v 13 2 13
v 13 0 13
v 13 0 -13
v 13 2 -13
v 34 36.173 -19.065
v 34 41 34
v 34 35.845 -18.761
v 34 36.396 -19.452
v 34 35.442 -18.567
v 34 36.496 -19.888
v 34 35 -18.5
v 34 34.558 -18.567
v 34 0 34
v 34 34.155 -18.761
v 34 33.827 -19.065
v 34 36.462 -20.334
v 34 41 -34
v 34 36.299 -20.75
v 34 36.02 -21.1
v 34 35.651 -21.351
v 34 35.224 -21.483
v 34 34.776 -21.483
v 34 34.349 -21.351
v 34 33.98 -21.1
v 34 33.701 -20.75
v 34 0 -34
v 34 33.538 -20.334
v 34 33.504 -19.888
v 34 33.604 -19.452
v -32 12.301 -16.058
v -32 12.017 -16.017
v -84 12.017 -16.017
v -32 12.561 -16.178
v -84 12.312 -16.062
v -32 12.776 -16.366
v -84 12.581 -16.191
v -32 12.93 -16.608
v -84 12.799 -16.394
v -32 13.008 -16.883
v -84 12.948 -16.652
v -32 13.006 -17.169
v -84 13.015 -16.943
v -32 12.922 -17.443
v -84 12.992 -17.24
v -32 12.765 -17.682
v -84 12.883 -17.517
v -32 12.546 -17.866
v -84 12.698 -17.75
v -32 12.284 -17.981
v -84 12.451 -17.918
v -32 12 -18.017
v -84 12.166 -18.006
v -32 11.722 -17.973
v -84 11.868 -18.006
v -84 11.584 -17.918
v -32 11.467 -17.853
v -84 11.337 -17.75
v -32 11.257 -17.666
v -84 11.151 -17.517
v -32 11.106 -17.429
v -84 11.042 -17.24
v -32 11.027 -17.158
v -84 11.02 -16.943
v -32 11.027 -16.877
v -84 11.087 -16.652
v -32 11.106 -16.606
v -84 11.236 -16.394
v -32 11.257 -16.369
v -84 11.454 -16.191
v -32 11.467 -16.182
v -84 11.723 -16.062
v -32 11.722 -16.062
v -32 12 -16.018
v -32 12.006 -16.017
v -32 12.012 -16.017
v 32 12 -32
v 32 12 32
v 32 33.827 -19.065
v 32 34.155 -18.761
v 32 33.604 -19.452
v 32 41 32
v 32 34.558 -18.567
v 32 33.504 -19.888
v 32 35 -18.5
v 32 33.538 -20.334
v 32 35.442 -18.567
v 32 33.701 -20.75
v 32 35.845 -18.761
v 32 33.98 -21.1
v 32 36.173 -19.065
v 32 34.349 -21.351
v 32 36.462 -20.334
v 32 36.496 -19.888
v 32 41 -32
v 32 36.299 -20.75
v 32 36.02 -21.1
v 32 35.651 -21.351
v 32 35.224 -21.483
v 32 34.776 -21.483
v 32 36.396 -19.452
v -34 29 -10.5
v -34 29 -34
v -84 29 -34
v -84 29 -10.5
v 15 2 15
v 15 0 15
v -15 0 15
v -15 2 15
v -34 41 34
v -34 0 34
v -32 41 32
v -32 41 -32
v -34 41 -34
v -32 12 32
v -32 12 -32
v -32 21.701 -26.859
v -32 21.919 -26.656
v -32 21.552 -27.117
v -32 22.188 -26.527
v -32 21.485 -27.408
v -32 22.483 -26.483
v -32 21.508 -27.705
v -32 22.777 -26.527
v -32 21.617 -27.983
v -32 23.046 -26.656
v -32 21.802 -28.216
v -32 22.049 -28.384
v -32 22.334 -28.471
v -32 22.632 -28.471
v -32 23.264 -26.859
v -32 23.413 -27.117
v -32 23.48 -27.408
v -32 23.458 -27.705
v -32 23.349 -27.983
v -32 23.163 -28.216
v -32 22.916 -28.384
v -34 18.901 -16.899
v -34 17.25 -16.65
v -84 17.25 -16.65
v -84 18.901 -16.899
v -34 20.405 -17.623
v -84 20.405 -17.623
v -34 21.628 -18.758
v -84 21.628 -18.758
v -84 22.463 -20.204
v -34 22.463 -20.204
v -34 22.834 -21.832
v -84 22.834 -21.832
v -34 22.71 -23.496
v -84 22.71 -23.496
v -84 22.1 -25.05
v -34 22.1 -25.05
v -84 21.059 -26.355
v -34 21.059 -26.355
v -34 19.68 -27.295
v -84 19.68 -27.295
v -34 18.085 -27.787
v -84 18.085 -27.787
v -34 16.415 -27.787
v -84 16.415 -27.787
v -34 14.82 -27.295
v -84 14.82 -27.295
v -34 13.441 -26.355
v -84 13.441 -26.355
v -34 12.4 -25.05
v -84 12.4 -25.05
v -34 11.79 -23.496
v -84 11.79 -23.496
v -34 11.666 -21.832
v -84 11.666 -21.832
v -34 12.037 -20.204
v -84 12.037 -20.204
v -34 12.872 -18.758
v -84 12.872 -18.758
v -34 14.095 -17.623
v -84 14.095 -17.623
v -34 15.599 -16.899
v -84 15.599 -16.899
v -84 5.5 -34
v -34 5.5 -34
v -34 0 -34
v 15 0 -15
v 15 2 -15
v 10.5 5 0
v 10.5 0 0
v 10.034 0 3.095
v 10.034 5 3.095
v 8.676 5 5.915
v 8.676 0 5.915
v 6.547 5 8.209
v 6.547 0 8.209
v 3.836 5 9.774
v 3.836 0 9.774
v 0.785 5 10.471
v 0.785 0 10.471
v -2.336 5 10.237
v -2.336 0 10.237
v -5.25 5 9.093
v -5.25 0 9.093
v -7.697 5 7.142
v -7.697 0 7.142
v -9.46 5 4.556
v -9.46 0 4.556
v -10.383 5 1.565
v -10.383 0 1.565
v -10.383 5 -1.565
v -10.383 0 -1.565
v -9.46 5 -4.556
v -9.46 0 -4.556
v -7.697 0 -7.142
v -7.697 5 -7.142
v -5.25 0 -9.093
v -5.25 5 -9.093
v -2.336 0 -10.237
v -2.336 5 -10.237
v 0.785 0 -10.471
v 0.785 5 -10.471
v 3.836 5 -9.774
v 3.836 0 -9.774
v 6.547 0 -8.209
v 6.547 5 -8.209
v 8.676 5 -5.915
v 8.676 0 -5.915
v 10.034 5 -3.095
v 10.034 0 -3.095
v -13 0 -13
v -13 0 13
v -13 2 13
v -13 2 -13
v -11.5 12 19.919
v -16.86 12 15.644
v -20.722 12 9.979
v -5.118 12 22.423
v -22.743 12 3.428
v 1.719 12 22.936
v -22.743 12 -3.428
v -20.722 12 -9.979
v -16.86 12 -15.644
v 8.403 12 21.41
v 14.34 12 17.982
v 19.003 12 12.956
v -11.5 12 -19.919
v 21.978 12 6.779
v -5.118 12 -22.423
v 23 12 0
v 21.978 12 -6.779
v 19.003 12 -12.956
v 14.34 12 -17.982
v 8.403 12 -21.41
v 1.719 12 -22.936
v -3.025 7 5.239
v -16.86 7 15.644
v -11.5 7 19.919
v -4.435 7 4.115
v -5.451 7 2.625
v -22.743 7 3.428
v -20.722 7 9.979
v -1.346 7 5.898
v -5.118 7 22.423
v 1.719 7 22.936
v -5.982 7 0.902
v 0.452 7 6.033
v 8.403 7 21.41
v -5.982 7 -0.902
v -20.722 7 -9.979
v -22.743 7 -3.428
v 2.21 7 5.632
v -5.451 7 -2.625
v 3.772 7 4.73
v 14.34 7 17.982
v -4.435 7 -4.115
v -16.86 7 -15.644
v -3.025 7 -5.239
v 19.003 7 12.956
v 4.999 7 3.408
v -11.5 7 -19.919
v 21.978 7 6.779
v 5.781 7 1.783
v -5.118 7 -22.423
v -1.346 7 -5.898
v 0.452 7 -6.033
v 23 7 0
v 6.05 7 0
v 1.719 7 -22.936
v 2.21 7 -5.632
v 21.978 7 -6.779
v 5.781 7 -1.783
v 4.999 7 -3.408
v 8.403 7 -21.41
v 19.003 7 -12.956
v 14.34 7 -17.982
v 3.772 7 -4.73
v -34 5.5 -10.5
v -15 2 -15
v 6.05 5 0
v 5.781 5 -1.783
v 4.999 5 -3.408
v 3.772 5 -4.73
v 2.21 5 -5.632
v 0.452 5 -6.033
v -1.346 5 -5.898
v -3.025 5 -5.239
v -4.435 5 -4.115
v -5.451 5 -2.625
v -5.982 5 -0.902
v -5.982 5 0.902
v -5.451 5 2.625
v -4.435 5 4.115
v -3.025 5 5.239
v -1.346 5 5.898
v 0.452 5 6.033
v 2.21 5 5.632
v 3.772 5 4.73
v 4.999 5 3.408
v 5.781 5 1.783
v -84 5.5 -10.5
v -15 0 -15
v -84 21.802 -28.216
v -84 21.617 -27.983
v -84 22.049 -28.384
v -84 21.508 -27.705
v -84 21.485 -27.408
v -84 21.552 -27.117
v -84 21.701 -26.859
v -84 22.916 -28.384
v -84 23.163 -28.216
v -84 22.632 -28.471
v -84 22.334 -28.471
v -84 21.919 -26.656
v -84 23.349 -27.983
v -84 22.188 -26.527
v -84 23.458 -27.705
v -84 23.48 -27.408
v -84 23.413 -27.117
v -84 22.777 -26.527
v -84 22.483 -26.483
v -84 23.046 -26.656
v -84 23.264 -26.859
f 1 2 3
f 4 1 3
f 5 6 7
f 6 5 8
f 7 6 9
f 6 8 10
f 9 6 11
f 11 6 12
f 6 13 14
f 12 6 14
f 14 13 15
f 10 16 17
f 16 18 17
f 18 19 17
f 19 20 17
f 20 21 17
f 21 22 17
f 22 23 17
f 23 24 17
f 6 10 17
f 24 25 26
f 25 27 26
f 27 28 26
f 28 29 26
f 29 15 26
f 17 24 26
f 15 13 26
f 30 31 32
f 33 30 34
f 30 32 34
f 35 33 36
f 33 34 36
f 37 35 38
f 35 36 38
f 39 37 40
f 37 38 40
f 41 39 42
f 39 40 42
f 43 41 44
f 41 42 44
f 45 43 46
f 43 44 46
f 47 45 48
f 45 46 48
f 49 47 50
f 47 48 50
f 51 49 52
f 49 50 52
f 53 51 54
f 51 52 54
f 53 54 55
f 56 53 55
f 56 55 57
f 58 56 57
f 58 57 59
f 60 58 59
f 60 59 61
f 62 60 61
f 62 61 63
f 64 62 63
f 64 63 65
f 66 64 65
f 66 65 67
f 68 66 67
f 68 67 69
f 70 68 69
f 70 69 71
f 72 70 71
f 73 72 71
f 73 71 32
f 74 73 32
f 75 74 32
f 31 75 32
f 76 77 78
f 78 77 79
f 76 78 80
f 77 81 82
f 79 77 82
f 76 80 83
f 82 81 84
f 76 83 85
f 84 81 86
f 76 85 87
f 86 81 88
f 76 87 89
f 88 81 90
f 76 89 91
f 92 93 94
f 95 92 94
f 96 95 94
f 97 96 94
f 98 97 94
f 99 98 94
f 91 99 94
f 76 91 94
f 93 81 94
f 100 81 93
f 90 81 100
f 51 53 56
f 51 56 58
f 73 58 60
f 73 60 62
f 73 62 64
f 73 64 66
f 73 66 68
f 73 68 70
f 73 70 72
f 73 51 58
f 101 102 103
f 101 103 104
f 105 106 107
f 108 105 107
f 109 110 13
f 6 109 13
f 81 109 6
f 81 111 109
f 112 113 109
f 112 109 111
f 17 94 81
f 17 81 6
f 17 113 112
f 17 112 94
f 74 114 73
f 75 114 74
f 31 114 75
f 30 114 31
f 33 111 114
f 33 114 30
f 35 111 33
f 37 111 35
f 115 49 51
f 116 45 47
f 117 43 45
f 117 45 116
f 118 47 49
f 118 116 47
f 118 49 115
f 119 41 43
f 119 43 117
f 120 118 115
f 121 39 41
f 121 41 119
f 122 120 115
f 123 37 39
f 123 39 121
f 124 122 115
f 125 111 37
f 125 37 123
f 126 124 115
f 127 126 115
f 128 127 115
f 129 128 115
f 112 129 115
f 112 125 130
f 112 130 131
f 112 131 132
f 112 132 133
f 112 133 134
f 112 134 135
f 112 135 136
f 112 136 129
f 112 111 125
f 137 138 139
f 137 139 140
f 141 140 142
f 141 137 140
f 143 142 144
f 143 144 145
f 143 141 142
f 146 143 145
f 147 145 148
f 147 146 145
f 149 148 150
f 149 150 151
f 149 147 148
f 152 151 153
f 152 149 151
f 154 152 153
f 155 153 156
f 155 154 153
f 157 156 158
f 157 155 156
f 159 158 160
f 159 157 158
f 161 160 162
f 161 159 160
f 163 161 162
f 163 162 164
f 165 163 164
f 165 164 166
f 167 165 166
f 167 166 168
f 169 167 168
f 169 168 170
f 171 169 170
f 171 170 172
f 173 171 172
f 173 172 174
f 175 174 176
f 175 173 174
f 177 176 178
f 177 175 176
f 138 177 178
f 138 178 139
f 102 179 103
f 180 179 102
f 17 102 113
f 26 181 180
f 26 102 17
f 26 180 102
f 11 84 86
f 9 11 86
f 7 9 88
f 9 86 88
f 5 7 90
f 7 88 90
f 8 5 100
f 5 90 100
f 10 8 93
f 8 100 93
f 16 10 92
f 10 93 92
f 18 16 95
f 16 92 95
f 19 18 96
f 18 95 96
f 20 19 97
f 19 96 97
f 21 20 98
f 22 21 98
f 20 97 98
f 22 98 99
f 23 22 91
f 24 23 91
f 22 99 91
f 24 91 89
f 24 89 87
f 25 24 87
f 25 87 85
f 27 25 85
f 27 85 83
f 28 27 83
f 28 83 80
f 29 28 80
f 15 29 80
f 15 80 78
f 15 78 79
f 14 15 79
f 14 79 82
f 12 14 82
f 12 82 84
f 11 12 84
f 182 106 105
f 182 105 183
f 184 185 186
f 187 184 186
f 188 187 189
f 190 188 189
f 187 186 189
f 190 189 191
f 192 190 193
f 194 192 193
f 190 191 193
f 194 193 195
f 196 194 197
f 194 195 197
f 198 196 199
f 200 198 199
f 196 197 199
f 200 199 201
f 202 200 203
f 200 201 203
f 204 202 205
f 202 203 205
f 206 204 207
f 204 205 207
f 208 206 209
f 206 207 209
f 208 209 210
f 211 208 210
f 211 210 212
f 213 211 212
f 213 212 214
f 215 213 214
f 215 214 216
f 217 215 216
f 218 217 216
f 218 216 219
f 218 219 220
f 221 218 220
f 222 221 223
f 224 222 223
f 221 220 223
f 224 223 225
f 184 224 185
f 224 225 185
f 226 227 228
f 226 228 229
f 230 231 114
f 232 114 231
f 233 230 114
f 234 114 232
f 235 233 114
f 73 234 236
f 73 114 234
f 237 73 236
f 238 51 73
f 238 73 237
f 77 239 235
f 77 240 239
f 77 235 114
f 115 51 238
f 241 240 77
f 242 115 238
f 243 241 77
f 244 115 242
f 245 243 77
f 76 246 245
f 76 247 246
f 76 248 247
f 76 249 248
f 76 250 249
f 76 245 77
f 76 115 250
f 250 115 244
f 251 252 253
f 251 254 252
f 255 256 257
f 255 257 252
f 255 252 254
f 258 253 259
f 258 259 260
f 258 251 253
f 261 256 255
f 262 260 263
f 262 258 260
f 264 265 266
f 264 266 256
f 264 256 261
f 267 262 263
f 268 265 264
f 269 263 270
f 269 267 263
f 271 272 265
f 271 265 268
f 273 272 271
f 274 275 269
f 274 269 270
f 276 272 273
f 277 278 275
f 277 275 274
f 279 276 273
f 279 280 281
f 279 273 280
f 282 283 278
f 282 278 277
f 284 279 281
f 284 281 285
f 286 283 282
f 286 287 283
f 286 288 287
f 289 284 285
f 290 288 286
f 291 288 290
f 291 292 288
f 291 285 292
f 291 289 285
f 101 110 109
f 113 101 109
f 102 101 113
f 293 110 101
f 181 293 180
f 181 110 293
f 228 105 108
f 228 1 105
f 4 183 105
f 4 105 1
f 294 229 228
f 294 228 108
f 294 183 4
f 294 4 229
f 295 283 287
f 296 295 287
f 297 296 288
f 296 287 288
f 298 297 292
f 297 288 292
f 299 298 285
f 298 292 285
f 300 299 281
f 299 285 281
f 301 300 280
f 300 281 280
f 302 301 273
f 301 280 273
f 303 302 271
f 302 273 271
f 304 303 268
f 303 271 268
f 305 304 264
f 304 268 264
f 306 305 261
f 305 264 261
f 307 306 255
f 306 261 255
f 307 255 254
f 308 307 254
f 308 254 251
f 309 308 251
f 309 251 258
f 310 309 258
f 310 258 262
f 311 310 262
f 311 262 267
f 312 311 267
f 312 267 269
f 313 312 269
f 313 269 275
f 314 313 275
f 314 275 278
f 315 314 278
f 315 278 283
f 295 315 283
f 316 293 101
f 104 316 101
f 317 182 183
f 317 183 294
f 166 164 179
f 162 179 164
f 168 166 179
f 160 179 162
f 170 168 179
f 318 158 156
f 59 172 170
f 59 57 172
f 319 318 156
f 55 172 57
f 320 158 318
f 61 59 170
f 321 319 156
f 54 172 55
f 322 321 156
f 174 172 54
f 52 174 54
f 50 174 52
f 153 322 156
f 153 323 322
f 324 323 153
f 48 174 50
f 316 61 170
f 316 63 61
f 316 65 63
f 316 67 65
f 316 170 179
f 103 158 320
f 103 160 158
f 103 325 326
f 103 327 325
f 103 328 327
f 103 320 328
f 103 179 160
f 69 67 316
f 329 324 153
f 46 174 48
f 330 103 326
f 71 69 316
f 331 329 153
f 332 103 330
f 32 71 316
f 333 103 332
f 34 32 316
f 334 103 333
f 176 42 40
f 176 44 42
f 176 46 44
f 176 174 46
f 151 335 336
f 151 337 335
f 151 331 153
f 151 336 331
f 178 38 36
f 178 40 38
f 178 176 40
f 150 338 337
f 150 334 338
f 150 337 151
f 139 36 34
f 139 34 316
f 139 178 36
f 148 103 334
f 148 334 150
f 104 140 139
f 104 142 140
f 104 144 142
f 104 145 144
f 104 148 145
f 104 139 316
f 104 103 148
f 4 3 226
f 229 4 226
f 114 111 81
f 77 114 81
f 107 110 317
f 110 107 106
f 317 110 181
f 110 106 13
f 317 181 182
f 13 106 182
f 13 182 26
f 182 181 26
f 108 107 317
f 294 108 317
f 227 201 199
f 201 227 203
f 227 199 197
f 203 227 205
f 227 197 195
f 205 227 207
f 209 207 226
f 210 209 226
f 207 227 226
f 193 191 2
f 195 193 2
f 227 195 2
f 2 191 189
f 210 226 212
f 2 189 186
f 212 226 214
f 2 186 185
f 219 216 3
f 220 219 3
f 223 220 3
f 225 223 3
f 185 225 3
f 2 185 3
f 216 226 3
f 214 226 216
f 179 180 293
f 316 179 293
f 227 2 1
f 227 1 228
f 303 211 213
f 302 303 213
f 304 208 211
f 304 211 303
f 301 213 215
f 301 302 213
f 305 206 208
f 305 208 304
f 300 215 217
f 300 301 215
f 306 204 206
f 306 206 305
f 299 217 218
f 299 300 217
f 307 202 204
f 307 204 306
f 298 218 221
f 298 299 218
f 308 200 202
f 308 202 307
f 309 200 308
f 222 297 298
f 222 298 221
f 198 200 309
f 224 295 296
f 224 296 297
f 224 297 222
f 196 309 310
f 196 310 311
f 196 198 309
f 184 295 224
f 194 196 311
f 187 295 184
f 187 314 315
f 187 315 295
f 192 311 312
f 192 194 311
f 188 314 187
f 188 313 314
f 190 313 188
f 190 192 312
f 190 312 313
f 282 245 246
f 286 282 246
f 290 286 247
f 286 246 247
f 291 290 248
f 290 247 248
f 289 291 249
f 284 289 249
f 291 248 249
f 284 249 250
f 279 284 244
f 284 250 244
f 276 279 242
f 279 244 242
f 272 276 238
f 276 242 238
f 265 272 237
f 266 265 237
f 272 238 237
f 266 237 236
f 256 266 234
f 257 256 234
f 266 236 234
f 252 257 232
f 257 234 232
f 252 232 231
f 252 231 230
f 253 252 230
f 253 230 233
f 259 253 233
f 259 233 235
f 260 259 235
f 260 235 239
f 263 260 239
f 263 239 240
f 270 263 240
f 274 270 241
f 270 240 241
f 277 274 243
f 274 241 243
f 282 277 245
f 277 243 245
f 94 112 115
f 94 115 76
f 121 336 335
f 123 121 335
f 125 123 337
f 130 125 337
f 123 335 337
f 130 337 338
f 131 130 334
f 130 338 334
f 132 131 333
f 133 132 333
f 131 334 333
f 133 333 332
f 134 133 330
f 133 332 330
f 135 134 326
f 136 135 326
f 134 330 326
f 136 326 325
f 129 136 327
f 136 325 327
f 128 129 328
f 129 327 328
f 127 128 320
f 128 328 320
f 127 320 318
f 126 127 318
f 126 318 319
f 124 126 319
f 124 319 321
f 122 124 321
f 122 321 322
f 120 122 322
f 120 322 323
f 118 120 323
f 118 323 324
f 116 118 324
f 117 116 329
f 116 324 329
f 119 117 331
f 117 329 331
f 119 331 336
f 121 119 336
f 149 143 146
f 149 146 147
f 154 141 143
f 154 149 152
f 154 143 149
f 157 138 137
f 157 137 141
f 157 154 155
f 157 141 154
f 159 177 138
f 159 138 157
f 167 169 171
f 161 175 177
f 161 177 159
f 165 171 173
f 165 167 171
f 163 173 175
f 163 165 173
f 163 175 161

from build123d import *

# Parameters (mm, degrees)
SKETCH1_W           = 68
SKETCH1_H           = 68
BOSS_EXTRUDE1_DEPTH = 41
CUT_EXTRUDE1_START  = 41
SKETCH2_W           = 64
SKETCH2_H           = 64
CUT_EXTRUDE1_DEPTH  = 29
CUT_EXTRUDE4_START  = 12
SKETCH3_R           = 23
CUT_EXTRUDE4_DEPTH  = 5
CUT_EXTRUDE9_START  = 7
SKETCH5_R           = 6.05
CUT_EXTRUDE9_DEPTH  = 8
SKETCH6_R           = 10.5
CUT_EXTRUDE10_DEPTH = 5
SKETCH7_W           = 30
SKETCH7_H           = 30
SKETCH7_W_2         = 26
SKETCH7_H_2         = 26
CUT_EXTRUDE11_DEPTH = 2
SKETCH8_R           = 1.5
CUT_EXTRUDE12_DEPTH = 3
SKETCH9_W           = 23.5
SKETCH9_H           = 23.5
SKETCH9_R           = 5.6
BOSS_EXTRUDE4_DEPTH = 50
SKETCH11_R          = 1
CUT_EXTRUDE13_DEPTH = 52


with BuildPart() as part:
    # Sketch1 → Boss-Extrude1 (new body)
    with BuildSketch(Plane(origin=(0, 0, 0), x_dir=(1, 0, 0), z_dir=(0, 1, 0))):
        Rectangle(SKETCH1_W, SKETCH1_H)
    extrude(amount=BOSS_EXTRUDE1_DEPTH)

    # Sketch2 → Cut-Extrude1 (cut)
    with BuildSketch(Plane(origin=(0, 0, 0), x_dir=(1, 0, 0), z_dir=(0, 1, 0)).offset(CUT_EXTRUDE1_START)):
        Rectangle(SKETCH2_W, SKETCH2_H)
    extrude(amount=-CUT_EXTRUDE1_DEPTH, mode=Mode.SUBTRACT)

    # Sketch3 → Cut-Extrude4 (cut)
    with BuildSketch(Plane(origin=(0, 0, 0), x_dir=(1, 0, 0), z_dir=(0, 1, 0)).offset(CUT_EXTRUDE4_START)):
        Circle(SKETCH3_R)
    extrude(amount=-CUT_EXTRUDE4_DEPTH, mode=Mode.SUBTRACT)

    # Sketch5 → Cut-Extrude9 (cut, through all)
    with BuildSketch(Plane(origin=(0, 0, 0), x_dir=(1, 0, 0), z_dir=(0, 1, 0)).offset(CUT_EXTRUDE9_START)):
        Circle(SKETCH5_R)
    extrude(amount=-CUT_EXTRUDE9_DEPTH, mode=Mode.SUBTRACT)

    # Sketch6 → Cut-Extrude10 (cut)
    with BuildSketch(Plane.XZ):
        Circle(SKETCH6_R)
    extrude(amount=-CUT_EXTRUDE10_DEPTH, mode=Mode.SUBTRACT)

    # Sketch7 → Cut-Extrude11 (cut)
    with BuildSketch(Plane(origin=(0, 0, 0), x_dir=(-1, 0, 0), z_dir=(0, -1, 0))):
        Rectangle(SKETCH7_W, SKETCH7_H)
        Rectangle(SKETCH7_W_2, SKETCH7_H_2, mode=Mode.SUBTRACT)
    extrude(amount=-CUT_EXTRUDE11_DEPTH, mode=Mode.SUBTRACT)

    # Sketch8 → Cut-Extrude12 (cut, through all)
    with BuildSketch(Plane.ZY.offset(-32)):
        with Locations((-20, 35)):
            Circle(SKETCH8_R)
    extrude(amount=-CUT_EXTRUDE12_DEPTH, mode=Mode.SUBTRACT)

    # Sketch9 → Boss-Extrude4 (add)
    with BuildSketch(Plane.ZY.offset(34)):
        with Locations((-22.25, 17.25)):
            Rectangle(SKETCH9_W, SKETCH9_H)
        with Locations((-22.25, 17.25)):
            Circle(SKETCH9_R, mode=Mode.SUBTRACT)
    extrude(amount=BOSS_EXTRUDE4_DEPTH)

    # Sketch11 → Cut-Extrude13 (cut)
    with BuildSketch(Plane.ZY.offset(84)):
        with Locations((-27.482590181, 22.482590181)):
            Circle(SKETCH11_R)
        with Locations((-17.017409819, 12.017409819)):
            Circle(SKETCH11_R)
    extrude(amount=-CUT_EXTRUDE13_DEPTH, mode=Mode.SUBTRACT)


solid = part.part
